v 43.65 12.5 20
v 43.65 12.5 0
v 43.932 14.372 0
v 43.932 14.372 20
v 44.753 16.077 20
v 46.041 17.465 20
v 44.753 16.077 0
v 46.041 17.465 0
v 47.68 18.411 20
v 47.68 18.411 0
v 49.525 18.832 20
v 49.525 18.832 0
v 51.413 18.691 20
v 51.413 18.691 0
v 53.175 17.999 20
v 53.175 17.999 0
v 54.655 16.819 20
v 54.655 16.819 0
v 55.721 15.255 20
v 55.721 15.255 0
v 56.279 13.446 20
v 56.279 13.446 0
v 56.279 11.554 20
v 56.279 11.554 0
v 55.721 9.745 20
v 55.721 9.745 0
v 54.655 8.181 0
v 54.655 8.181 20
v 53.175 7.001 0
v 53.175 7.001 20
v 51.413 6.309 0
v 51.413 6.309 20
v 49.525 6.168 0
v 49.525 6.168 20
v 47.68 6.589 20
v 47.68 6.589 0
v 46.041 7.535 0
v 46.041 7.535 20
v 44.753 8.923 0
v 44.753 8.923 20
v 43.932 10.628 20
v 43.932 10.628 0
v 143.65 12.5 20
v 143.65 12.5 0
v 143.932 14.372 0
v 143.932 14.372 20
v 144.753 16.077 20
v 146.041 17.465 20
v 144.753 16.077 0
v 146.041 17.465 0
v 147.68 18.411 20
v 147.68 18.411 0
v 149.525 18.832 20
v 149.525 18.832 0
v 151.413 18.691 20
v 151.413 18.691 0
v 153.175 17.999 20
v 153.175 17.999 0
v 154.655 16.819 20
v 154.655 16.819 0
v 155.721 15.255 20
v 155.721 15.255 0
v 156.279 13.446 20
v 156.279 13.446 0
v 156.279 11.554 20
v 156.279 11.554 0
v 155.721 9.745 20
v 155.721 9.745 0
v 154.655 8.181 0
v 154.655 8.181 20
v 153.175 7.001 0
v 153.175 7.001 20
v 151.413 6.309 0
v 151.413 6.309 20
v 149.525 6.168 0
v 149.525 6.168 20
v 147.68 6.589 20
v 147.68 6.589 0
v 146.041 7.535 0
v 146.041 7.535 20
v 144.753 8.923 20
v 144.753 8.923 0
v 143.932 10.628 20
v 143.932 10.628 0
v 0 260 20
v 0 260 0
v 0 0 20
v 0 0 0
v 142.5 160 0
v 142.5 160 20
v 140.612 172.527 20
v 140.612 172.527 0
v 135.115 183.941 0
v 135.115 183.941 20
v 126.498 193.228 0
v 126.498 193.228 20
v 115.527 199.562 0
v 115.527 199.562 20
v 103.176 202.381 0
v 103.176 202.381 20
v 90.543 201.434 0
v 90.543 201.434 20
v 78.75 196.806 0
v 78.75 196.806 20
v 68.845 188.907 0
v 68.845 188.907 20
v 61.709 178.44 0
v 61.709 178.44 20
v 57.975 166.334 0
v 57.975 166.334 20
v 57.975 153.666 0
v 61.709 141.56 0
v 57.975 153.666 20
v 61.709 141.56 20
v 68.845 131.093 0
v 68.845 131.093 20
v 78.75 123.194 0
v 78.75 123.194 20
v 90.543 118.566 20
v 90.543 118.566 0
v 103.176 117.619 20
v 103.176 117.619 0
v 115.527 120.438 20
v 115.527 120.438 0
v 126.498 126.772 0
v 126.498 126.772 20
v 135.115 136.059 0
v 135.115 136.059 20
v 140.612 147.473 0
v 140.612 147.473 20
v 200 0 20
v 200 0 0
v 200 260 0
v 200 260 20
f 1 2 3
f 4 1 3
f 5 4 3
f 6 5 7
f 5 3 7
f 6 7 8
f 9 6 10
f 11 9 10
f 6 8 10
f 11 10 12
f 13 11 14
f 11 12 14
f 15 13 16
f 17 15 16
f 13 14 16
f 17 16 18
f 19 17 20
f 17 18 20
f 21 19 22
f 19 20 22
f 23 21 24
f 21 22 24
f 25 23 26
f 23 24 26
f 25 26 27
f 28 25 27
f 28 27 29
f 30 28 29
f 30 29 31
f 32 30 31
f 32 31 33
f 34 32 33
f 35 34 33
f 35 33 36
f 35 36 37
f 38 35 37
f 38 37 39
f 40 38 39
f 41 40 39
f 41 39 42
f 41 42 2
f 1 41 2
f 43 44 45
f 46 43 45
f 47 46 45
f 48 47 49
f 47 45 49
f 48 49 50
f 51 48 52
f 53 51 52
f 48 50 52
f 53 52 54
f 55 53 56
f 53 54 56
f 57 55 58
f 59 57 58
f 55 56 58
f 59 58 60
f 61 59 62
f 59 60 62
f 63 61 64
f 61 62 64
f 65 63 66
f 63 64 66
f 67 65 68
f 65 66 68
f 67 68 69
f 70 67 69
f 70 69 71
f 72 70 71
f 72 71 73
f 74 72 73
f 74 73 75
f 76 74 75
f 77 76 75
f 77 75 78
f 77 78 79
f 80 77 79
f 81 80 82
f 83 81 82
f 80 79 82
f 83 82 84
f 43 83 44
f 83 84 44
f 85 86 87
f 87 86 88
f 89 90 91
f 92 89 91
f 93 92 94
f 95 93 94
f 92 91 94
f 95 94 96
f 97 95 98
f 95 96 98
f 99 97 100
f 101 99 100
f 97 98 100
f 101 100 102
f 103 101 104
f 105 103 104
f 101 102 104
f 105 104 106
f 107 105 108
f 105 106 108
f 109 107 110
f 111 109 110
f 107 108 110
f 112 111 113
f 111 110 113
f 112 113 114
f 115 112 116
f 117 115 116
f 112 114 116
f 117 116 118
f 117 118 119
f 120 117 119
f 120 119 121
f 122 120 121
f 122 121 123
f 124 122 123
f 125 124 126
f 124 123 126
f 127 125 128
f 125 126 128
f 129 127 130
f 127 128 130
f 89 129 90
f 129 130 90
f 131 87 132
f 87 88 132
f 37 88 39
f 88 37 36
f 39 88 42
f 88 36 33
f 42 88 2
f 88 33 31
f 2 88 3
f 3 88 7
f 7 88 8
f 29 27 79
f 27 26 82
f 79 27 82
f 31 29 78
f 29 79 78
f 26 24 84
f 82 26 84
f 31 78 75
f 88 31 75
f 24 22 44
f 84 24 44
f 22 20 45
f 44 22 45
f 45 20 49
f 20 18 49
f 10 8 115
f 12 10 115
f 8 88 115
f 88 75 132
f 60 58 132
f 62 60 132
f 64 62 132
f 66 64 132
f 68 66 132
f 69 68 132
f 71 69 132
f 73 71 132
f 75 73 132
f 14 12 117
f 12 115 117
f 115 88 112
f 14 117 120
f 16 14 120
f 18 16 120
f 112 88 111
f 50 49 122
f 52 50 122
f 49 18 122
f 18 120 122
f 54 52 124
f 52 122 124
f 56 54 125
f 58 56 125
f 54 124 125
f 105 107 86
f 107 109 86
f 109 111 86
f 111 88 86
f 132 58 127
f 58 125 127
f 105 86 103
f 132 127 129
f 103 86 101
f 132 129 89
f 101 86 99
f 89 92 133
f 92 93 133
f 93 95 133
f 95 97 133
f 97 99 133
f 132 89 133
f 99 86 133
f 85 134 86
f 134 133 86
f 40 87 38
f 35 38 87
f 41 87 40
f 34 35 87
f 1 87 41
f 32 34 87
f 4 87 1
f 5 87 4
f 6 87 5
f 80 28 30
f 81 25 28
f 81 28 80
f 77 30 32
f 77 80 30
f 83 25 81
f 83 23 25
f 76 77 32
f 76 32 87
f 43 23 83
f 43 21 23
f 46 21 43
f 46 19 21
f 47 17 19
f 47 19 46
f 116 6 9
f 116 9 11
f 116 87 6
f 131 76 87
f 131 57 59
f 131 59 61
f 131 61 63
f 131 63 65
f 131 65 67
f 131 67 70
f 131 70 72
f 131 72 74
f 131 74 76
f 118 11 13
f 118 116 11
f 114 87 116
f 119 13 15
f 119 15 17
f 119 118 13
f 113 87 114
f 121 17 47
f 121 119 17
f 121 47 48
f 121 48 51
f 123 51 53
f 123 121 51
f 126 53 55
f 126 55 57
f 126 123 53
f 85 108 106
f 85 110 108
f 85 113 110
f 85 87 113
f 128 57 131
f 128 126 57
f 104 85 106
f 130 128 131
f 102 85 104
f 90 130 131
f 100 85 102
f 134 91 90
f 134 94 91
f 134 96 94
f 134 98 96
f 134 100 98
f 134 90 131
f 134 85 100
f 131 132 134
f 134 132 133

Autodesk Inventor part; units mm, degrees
ref_plane "YZ Plane" through (0, 0, 0) normal (1, 0, 0) x (0, 1, 0)
ref_plane "XZ Plane" through (0, 0, 0) normal (0, 1, 0) x (-1, 0, 0)
ref_plane "XY Plane" through (0, 0, 0) normal (0, 0, 1) x (1, 0, 0)
sketch "Sketch1" plane through (0, 0, 0) normal (0, 0, 1) x (1, 0, 0)
  line L0 (0, 0) -> (200, 0)
  line L1 (200, 0) -> (200, 260)
  line L2 (200, 260) -> (0, 260)
  line L3 (0, 260) -> (0, 0)
  dimension "d0" = 200
  dimension "d1" = 260
extrude "Extrusion1" add sketch "Sketch1" along normal blind 20
sketch "Sketch2" plane through (0, 0, 20) normal (0, 0, 1) x (1, 0, 0)
  circle A0 centre (100, 160) radius 42.5
  line L0 (200, 260) -> (0, 260) projected
  line L1 (0, 260) -> (0, 0) projected
  dimension "d4" = 85
  dimension "d5" = 100
  dimension "d6" = 100
extrude "Extrusion2" cut sketch "Sketch2" against normal blind 20
sketch "Sketch3" plane through (0, 0, 0) normal (0, 0, -1) x (-1, 0, 0)
  circle A0 centre (-150, 12.5) radius 6.35
  circle A1 centre (-50, 12.5) radius 6.35
  line L0 (0, 0) -> (-200, 0) projected
  line L1 (-200, 0) -> (-200, 260) projected
  line L2 (0, 260) -> (0, 0) projected
  dimension "d9" = 12.7
  dimension "d10" = 12.7
  dimension "d11" = 12.5
  dimension "d12" = 12.5
  dimension "d13" = 50
  dimension "d14" = 50
extrude "Extrusion3" cut sketch "Sketch3" against normal blind 20
equation "\"d12\" = d11"
equation "\"d14\" = d13"
properties part number "FloorMountFacePlate"
